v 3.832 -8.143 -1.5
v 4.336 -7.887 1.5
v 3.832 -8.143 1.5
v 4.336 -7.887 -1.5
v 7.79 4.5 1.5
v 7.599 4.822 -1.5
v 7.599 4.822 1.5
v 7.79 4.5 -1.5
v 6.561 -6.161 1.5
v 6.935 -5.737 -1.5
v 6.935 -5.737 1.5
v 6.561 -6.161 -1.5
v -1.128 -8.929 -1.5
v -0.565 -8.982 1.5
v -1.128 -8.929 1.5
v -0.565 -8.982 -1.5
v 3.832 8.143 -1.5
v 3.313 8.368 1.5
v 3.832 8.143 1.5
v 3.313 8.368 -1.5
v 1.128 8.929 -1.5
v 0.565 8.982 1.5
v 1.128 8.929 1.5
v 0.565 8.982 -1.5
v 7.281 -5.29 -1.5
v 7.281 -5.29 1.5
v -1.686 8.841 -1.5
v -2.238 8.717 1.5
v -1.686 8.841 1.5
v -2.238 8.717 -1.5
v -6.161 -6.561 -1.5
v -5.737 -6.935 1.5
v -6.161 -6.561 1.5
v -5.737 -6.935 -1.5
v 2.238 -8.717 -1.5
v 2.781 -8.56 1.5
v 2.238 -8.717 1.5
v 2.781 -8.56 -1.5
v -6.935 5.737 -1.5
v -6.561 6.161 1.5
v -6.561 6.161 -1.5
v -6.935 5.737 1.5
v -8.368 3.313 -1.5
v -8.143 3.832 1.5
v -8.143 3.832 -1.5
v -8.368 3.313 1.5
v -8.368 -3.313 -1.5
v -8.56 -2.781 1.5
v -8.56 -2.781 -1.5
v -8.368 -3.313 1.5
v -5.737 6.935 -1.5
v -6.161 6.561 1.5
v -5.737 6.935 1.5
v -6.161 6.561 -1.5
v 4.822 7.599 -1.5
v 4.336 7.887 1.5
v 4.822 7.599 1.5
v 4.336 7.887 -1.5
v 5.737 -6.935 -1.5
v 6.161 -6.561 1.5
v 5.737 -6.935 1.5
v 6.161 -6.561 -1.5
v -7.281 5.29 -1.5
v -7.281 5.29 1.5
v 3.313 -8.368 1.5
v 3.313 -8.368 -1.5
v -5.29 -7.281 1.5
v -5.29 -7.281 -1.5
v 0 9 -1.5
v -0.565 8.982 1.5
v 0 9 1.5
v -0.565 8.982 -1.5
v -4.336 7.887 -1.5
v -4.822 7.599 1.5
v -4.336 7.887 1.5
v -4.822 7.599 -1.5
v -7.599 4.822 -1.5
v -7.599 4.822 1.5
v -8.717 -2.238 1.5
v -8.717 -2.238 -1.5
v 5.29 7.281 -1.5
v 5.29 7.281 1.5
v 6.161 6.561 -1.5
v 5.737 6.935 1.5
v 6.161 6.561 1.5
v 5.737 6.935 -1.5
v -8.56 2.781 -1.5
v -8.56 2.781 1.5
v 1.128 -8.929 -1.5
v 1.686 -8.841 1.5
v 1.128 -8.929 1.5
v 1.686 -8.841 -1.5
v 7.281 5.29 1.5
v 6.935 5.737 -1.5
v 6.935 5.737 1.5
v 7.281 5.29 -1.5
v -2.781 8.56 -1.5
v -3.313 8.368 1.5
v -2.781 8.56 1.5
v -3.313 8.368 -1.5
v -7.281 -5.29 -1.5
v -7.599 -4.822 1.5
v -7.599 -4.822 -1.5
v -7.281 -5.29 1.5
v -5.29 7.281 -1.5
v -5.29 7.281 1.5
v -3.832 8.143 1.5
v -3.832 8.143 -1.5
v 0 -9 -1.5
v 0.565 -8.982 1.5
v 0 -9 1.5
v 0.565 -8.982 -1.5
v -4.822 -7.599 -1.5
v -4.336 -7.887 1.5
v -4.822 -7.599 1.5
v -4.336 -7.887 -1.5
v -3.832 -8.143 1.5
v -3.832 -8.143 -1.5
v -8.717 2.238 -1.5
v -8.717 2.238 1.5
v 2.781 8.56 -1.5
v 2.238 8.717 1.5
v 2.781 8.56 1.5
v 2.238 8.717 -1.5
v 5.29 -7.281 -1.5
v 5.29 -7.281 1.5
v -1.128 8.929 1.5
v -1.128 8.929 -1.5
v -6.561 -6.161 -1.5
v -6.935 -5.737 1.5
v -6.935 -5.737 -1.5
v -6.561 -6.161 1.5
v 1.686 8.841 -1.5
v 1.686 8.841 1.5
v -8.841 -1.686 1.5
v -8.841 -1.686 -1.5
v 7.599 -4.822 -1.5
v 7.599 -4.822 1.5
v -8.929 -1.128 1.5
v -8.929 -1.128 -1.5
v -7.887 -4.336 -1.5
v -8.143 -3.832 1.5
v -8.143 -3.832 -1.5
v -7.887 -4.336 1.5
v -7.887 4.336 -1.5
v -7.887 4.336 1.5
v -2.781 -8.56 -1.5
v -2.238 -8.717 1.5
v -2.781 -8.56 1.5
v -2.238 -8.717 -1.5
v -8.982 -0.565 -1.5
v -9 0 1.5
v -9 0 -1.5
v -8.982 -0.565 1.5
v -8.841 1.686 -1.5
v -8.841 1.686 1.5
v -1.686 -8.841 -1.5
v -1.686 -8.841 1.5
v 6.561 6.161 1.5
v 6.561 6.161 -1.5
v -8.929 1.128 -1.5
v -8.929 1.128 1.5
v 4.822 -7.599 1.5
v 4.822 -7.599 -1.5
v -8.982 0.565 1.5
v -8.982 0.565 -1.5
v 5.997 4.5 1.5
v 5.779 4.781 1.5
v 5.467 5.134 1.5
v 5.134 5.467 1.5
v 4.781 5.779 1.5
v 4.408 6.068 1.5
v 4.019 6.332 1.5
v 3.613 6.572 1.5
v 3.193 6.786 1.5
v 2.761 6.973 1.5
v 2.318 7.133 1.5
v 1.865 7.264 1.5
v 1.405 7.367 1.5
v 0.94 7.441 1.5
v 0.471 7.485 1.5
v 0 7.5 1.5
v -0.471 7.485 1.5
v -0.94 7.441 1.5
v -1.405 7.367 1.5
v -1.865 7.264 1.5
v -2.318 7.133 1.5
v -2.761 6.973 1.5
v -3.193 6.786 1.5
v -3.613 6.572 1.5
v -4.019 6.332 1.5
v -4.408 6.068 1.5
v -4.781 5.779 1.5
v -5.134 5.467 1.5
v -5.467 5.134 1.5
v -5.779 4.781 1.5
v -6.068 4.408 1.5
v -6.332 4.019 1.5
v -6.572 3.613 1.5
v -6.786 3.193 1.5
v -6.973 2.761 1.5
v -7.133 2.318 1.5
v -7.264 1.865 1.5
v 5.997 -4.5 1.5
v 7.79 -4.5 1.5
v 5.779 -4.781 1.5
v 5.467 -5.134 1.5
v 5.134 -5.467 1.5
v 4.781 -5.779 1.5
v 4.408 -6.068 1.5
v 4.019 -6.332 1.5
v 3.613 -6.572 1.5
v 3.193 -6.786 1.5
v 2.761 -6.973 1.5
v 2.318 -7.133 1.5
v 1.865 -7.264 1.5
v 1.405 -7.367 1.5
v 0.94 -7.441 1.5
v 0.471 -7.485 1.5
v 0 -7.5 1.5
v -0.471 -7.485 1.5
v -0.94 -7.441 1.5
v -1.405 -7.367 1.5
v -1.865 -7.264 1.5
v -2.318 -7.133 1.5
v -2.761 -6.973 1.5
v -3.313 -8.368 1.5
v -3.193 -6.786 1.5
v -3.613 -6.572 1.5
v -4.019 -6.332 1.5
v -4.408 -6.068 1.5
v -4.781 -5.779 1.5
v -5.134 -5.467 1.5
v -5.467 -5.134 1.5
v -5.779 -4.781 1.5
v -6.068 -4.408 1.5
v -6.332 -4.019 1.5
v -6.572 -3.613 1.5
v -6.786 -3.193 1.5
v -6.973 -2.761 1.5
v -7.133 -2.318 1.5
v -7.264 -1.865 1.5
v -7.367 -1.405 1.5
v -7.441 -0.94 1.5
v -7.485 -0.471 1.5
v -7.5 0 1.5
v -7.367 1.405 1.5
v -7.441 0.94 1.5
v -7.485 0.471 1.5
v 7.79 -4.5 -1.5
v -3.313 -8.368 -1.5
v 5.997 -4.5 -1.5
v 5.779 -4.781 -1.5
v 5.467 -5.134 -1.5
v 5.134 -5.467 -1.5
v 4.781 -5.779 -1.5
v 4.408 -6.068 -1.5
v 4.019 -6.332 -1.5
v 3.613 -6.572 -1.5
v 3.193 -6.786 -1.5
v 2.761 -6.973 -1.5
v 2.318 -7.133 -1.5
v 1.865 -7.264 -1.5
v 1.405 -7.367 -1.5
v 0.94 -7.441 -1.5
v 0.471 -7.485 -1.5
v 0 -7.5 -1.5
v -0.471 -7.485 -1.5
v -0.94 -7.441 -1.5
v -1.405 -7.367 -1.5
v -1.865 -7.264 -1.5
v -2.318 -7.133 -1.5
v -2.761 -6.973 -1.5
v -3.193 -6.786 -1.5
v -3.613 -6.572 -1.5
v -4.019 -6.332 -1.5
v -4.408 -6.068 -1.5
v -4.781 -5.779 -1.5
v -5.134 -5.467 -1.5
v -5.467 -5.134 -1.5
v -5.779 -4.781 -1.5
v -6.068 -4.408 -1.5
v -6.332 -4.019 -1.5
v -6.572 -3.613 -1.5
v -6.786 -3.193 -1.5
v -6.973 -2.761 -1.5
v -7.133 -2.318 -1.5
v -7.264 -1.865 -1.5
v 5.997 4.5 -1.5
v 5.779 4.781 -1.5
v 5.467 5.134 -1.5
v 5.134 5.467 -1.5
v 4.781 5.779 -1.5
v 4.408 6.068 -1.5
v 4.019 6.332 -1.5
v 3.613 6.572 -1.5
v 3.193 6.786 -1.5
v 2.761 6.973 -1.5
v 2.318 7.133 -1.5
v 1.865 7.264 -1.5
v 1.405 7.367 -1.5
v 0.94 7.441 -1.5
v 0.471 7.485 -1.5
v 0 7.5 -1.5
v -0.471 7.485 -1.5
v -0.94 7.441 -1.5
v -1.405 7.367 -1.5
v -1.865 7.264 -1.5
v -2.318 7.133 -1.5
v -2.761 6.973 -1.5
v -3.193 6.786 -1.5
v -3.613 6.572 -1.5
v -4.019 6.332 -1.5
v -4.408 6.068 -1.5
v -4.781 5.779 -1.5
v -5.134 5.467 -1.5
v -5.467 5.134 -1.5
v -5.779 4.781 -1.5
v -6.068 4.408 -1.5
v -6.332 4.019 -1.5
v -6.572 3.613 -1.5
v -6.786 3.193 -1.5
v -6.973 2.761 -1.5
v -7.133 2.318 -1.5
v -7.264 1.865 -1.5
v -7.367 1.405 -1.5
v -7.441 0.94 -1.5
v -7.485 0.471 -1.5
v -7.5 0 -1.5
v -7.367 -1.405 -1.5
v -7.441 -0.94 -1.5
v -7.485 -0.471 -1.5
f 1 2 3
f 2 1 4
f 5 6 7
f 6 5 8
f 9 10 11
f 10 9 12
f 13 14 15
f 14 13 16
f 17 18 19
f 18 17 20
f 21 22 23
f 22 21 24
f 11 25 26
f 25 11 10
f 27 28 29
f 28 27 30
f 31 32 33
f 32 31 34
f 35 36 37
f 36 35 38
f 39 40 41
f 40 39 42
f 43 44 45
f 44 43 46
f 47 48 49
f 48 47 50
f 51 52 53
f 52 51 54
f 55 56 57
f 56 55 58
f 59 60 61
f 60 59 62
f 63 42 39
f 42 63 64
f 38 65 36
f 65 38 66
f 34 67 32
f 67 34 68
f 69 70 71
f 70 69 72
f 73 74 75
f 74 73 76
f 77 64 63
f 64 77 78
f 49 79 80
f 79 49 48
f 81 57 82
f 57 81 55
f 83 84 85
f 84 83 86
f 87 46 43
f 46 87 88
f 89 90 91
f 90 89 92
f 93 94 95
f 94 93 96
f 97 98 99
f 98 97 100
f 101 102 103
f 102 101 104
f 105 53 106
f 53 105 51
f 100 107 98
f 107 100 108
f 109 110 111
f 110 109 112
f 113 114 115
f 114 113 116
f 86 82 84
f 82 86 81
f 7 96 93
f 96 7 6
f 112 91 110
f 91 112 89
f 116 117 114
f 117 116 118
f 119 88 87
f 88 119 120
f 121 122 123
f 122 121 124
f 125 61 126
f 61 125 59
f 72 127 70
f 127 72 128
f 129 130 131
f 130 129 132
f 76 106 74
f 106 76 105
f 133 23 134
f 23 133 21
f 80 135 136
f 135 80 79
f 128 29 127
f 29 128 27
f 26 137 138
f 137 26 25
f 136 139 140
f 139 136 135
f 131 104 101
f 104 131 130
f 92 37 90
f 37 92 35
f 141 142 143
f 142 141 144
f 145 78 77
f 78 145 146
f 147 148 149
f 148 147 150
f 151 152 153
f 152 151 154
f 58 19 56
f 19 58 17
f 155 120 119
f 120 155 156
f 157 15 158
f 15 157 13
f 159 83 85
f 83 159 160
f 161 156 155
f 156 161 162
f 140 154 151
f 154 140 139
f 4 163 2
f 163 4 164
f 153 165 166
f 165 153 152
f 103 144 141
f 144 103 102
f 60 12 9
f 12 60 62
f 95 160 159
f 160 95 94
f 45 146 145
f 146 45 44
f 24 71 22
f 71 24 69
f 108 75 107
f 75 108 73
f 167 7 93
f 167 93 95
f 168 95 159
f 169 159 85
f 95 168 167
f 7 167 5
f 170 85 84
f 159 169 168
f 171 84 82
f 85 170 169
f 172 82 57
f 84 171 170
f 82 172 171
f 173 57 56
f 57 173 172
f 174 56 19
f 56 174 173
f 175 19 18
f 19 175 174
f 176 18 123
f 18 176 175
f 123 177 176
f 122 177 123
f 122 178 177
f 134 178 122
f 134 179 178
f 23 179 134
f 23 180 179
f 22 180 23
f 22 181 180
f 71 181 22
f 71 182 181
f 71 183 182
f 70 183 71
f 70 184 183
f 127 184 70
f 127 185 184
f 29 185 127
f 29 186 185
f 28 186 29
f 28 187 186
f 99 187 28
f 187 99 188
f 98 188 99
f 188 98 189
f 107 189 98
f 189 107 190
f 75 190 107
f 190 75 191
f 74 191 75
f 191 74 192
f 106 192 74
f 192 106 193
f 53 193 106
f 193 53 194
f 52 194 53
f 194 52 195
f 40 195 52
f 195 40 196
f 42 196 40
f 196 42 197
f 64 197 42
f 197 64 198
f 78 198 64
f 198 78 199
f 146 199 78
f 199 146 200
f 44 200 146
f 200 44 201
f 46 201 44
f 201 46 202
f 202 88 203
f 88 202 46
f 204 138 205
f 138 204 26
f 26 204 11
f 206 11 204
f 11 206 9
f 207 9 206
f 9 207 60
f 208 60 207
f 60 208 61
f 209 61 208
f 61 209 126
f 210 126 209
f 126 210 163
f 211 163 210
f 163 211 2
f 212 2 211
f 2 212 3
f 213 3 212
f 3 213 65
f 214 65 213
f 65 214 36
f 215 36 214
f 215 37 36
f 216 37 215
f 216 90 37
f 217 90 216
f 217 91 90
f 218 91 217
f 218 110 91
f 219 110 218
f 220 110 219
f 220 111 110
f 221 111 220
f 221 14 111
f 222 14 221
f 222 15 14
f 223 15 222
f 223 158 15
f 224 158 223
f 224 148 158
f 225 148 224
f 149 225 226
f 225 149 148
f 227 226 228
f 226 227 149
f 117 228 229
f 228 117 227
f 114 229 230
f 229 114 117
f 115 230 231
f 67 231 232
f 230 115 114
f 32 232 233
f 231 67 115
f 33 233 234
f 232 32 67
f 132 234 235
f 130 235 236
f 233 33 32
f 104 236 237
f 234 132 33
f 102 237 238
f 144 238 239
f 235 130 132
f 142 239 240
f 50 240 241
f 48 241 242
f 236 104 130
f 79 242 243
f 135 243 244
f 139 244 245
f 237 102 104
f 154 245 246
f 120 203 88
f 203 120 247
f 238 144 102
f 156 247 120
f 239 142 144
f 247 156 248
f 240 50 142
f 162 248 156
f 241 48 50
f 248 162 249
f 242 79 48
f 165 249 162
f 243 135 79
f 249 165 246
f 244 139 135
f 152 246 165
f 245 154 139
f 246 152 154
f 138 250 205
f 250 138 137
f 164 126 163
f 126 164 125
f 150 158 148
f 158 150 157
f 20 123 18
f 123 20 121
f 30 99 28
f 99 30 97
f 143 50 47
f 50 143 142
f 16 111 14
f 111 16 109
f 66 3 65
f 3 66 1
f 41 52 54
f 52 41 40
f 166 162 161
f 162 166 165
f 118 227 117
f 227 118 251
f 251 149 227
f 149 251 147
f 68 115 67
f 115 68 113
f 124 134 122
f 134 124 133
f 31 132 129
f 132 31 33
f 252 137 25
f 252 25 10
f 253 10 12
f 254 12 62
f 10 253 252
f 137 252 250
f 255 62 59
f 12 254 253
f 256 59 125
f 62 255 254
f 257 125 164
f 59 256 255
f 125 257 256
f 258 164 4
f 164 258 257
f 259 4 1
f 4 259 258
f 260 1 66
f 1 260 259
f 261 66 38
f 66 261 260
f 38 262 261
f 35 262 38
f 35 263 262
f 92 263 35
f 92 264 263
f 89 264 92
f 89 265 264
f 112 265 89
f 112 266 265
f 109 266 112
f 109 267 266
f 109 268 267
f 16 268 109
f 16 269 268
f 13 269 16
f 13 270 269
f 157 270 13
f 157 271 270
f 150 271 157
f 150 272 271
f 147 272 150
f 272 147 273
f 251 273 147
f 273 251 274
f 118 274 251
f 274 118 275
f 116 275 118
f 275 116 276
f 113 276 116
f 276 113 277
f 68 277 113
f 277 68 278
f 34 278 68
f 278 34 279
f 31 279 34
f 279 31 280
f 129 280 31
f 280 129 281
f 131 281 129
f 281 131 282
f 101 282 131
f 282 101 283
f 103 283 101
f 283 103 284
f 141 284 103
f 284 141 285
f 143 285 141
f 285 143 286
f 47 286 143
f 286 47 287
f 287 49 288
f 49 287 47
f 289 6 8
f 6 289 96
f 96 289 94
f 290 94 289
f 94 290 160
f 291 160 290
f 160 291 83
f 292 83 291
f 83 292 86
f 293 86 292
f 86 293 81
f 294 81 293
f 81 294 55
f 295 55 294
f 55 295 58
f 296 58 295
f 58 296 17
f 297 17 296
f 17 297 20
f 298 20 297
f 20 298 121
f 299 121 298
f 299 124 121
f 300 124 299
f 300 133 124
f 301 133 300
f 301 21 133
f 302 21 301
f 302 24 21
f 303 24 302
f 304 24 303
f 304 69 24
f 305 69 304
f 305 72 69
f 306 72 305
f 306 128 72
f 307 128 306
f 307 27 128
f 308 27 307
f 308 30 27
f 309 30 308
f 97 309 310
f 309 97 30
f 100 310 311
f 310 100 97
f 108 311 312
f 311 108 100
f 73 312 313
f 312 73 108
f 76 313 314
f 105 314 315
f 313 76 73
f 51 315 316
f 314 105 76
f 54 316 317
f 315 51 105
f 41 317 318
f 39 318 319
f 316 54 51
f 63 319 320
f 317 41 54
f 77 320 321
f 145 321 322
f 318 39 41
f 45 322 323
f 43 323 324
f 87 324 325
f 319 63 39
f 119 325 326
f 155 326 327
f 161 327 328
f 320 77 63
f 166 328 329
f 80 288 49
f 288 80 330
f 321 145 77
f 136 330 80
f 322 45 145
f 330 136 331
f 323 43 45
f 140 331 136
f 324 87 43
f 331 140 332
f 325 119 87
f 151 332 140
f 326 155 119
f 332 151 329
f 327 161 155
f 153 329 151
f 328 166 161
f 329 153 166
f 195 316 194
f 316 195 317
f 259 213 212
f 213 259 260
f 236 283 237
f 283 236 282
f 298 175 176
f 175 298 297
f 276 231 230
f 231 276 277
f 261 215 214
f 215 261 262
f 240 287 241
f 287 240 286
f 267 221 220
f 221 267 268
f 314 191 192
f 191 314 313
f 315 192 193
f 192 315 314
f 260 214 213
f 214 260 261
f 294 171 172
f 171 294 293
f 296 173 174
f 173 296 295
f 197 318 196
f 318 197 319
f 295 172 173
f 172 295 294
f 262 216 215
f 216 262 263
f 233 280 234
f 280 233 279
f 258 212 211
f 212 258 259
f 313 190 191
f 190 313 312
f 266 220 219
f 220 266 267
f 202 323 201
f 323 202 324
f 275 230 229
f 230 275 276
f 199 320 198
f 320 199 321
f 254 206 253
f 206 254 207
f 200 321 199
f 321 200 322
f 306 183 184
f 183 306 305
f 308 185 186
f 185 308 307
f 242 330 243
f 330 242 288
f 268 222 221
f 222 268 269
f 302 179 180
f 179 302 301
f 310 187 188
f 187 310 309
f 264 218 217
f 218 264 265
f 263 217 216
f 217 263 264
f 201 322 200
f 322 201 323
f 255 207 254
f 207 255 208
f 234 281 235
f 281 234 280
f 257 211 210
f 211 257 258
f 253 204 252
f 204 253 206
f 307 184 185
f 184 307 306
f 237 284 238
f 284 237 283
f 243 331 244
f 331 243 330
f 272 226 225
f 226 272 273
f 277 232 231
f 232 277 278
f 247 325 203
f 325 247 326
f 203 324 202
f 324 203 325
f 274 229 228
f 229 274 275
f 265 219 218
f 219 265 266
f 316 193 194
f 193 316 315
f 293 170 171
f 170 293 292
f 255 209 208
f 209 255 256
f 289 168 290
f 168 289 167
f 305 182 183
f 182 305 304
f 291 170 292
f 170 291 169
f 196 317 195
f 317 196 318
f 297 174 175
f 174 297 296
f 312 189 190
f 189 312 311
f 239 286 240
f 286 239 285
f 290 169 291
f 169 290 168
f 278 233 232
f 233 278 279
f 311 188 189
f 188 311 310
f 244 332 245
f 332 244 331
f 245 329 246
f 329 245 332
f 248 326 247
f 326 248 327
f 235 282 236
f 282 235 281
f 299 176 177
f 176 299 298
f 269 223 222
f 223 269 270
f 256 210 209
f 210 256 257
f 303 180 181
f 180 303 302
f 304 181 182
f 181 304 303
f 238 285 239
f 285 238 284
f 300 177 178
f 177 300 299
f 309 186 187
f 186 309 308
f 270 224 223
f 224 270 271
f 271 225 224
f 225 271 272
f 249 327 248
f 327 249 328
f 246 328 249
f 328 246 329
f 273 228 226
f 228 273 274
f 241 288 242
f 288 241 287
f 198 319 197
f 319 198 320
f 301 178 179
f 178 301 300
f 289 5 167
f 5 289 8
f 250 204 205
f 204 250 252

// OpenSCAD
$fn = $preview ? 30 : 100;

// d_out = 23;  // For Tomeks printer
d_out = 22.7;  // For my printer
batt_spacer = 3;

module middle_clip() {
	difference() {
		cylinder(h=25, d=d_out, center=true);

		// blind hole
		translate([0, 0, 10 + batt_spacer / 2])
			cylinder(h=20, d=19, center=true);
		translate([0, 0, -10 - batt_spacer / 2])
			cylinder(h=20, d=19, center=true);

		// through hole
		cylinder(h=40, d=15, center=true);

		// cut in two
		translate([10, 0, 0])
			cube(size=[20, 9, 50], center=true);

		// notch for easier bending / cable routing
		for (angle=[0:45:361])
			rotate([0, 0, angle])
				translate([-8.1, 0, 0])
					cylinder(d=5, h=50, center=true);

	}
}


module end_clip() {
	difference() {
		translate([0, 0, -25 / 4])
			cylinder(h=25 / 2, d=d_out, center=true);

		// blind hole
		translate([0, 0, -10 - 1])
			cylinder(h=20, d=19, center=true);

		// cut in two
		translate([15, 0, 0])
			cube(size=[20, 9, 50], center=true);

		// notch for easier bending / cable routing
		translate([-14.8, 0, 0])
			cube(size=[10, 5, 50], center=true);

	}
}

module c_clip() {
	difference() {
		cylinder(h=batt_spacer, d=18, center=true);

		// through hole
		cylinder(h=40, d=15, center=true);

		// cut in two
		translate([10, 0, 0])
			cube(size=[20, 9, 50], center=true);
	}
}

// middle_clip();
// end_clip();
c_clip();
